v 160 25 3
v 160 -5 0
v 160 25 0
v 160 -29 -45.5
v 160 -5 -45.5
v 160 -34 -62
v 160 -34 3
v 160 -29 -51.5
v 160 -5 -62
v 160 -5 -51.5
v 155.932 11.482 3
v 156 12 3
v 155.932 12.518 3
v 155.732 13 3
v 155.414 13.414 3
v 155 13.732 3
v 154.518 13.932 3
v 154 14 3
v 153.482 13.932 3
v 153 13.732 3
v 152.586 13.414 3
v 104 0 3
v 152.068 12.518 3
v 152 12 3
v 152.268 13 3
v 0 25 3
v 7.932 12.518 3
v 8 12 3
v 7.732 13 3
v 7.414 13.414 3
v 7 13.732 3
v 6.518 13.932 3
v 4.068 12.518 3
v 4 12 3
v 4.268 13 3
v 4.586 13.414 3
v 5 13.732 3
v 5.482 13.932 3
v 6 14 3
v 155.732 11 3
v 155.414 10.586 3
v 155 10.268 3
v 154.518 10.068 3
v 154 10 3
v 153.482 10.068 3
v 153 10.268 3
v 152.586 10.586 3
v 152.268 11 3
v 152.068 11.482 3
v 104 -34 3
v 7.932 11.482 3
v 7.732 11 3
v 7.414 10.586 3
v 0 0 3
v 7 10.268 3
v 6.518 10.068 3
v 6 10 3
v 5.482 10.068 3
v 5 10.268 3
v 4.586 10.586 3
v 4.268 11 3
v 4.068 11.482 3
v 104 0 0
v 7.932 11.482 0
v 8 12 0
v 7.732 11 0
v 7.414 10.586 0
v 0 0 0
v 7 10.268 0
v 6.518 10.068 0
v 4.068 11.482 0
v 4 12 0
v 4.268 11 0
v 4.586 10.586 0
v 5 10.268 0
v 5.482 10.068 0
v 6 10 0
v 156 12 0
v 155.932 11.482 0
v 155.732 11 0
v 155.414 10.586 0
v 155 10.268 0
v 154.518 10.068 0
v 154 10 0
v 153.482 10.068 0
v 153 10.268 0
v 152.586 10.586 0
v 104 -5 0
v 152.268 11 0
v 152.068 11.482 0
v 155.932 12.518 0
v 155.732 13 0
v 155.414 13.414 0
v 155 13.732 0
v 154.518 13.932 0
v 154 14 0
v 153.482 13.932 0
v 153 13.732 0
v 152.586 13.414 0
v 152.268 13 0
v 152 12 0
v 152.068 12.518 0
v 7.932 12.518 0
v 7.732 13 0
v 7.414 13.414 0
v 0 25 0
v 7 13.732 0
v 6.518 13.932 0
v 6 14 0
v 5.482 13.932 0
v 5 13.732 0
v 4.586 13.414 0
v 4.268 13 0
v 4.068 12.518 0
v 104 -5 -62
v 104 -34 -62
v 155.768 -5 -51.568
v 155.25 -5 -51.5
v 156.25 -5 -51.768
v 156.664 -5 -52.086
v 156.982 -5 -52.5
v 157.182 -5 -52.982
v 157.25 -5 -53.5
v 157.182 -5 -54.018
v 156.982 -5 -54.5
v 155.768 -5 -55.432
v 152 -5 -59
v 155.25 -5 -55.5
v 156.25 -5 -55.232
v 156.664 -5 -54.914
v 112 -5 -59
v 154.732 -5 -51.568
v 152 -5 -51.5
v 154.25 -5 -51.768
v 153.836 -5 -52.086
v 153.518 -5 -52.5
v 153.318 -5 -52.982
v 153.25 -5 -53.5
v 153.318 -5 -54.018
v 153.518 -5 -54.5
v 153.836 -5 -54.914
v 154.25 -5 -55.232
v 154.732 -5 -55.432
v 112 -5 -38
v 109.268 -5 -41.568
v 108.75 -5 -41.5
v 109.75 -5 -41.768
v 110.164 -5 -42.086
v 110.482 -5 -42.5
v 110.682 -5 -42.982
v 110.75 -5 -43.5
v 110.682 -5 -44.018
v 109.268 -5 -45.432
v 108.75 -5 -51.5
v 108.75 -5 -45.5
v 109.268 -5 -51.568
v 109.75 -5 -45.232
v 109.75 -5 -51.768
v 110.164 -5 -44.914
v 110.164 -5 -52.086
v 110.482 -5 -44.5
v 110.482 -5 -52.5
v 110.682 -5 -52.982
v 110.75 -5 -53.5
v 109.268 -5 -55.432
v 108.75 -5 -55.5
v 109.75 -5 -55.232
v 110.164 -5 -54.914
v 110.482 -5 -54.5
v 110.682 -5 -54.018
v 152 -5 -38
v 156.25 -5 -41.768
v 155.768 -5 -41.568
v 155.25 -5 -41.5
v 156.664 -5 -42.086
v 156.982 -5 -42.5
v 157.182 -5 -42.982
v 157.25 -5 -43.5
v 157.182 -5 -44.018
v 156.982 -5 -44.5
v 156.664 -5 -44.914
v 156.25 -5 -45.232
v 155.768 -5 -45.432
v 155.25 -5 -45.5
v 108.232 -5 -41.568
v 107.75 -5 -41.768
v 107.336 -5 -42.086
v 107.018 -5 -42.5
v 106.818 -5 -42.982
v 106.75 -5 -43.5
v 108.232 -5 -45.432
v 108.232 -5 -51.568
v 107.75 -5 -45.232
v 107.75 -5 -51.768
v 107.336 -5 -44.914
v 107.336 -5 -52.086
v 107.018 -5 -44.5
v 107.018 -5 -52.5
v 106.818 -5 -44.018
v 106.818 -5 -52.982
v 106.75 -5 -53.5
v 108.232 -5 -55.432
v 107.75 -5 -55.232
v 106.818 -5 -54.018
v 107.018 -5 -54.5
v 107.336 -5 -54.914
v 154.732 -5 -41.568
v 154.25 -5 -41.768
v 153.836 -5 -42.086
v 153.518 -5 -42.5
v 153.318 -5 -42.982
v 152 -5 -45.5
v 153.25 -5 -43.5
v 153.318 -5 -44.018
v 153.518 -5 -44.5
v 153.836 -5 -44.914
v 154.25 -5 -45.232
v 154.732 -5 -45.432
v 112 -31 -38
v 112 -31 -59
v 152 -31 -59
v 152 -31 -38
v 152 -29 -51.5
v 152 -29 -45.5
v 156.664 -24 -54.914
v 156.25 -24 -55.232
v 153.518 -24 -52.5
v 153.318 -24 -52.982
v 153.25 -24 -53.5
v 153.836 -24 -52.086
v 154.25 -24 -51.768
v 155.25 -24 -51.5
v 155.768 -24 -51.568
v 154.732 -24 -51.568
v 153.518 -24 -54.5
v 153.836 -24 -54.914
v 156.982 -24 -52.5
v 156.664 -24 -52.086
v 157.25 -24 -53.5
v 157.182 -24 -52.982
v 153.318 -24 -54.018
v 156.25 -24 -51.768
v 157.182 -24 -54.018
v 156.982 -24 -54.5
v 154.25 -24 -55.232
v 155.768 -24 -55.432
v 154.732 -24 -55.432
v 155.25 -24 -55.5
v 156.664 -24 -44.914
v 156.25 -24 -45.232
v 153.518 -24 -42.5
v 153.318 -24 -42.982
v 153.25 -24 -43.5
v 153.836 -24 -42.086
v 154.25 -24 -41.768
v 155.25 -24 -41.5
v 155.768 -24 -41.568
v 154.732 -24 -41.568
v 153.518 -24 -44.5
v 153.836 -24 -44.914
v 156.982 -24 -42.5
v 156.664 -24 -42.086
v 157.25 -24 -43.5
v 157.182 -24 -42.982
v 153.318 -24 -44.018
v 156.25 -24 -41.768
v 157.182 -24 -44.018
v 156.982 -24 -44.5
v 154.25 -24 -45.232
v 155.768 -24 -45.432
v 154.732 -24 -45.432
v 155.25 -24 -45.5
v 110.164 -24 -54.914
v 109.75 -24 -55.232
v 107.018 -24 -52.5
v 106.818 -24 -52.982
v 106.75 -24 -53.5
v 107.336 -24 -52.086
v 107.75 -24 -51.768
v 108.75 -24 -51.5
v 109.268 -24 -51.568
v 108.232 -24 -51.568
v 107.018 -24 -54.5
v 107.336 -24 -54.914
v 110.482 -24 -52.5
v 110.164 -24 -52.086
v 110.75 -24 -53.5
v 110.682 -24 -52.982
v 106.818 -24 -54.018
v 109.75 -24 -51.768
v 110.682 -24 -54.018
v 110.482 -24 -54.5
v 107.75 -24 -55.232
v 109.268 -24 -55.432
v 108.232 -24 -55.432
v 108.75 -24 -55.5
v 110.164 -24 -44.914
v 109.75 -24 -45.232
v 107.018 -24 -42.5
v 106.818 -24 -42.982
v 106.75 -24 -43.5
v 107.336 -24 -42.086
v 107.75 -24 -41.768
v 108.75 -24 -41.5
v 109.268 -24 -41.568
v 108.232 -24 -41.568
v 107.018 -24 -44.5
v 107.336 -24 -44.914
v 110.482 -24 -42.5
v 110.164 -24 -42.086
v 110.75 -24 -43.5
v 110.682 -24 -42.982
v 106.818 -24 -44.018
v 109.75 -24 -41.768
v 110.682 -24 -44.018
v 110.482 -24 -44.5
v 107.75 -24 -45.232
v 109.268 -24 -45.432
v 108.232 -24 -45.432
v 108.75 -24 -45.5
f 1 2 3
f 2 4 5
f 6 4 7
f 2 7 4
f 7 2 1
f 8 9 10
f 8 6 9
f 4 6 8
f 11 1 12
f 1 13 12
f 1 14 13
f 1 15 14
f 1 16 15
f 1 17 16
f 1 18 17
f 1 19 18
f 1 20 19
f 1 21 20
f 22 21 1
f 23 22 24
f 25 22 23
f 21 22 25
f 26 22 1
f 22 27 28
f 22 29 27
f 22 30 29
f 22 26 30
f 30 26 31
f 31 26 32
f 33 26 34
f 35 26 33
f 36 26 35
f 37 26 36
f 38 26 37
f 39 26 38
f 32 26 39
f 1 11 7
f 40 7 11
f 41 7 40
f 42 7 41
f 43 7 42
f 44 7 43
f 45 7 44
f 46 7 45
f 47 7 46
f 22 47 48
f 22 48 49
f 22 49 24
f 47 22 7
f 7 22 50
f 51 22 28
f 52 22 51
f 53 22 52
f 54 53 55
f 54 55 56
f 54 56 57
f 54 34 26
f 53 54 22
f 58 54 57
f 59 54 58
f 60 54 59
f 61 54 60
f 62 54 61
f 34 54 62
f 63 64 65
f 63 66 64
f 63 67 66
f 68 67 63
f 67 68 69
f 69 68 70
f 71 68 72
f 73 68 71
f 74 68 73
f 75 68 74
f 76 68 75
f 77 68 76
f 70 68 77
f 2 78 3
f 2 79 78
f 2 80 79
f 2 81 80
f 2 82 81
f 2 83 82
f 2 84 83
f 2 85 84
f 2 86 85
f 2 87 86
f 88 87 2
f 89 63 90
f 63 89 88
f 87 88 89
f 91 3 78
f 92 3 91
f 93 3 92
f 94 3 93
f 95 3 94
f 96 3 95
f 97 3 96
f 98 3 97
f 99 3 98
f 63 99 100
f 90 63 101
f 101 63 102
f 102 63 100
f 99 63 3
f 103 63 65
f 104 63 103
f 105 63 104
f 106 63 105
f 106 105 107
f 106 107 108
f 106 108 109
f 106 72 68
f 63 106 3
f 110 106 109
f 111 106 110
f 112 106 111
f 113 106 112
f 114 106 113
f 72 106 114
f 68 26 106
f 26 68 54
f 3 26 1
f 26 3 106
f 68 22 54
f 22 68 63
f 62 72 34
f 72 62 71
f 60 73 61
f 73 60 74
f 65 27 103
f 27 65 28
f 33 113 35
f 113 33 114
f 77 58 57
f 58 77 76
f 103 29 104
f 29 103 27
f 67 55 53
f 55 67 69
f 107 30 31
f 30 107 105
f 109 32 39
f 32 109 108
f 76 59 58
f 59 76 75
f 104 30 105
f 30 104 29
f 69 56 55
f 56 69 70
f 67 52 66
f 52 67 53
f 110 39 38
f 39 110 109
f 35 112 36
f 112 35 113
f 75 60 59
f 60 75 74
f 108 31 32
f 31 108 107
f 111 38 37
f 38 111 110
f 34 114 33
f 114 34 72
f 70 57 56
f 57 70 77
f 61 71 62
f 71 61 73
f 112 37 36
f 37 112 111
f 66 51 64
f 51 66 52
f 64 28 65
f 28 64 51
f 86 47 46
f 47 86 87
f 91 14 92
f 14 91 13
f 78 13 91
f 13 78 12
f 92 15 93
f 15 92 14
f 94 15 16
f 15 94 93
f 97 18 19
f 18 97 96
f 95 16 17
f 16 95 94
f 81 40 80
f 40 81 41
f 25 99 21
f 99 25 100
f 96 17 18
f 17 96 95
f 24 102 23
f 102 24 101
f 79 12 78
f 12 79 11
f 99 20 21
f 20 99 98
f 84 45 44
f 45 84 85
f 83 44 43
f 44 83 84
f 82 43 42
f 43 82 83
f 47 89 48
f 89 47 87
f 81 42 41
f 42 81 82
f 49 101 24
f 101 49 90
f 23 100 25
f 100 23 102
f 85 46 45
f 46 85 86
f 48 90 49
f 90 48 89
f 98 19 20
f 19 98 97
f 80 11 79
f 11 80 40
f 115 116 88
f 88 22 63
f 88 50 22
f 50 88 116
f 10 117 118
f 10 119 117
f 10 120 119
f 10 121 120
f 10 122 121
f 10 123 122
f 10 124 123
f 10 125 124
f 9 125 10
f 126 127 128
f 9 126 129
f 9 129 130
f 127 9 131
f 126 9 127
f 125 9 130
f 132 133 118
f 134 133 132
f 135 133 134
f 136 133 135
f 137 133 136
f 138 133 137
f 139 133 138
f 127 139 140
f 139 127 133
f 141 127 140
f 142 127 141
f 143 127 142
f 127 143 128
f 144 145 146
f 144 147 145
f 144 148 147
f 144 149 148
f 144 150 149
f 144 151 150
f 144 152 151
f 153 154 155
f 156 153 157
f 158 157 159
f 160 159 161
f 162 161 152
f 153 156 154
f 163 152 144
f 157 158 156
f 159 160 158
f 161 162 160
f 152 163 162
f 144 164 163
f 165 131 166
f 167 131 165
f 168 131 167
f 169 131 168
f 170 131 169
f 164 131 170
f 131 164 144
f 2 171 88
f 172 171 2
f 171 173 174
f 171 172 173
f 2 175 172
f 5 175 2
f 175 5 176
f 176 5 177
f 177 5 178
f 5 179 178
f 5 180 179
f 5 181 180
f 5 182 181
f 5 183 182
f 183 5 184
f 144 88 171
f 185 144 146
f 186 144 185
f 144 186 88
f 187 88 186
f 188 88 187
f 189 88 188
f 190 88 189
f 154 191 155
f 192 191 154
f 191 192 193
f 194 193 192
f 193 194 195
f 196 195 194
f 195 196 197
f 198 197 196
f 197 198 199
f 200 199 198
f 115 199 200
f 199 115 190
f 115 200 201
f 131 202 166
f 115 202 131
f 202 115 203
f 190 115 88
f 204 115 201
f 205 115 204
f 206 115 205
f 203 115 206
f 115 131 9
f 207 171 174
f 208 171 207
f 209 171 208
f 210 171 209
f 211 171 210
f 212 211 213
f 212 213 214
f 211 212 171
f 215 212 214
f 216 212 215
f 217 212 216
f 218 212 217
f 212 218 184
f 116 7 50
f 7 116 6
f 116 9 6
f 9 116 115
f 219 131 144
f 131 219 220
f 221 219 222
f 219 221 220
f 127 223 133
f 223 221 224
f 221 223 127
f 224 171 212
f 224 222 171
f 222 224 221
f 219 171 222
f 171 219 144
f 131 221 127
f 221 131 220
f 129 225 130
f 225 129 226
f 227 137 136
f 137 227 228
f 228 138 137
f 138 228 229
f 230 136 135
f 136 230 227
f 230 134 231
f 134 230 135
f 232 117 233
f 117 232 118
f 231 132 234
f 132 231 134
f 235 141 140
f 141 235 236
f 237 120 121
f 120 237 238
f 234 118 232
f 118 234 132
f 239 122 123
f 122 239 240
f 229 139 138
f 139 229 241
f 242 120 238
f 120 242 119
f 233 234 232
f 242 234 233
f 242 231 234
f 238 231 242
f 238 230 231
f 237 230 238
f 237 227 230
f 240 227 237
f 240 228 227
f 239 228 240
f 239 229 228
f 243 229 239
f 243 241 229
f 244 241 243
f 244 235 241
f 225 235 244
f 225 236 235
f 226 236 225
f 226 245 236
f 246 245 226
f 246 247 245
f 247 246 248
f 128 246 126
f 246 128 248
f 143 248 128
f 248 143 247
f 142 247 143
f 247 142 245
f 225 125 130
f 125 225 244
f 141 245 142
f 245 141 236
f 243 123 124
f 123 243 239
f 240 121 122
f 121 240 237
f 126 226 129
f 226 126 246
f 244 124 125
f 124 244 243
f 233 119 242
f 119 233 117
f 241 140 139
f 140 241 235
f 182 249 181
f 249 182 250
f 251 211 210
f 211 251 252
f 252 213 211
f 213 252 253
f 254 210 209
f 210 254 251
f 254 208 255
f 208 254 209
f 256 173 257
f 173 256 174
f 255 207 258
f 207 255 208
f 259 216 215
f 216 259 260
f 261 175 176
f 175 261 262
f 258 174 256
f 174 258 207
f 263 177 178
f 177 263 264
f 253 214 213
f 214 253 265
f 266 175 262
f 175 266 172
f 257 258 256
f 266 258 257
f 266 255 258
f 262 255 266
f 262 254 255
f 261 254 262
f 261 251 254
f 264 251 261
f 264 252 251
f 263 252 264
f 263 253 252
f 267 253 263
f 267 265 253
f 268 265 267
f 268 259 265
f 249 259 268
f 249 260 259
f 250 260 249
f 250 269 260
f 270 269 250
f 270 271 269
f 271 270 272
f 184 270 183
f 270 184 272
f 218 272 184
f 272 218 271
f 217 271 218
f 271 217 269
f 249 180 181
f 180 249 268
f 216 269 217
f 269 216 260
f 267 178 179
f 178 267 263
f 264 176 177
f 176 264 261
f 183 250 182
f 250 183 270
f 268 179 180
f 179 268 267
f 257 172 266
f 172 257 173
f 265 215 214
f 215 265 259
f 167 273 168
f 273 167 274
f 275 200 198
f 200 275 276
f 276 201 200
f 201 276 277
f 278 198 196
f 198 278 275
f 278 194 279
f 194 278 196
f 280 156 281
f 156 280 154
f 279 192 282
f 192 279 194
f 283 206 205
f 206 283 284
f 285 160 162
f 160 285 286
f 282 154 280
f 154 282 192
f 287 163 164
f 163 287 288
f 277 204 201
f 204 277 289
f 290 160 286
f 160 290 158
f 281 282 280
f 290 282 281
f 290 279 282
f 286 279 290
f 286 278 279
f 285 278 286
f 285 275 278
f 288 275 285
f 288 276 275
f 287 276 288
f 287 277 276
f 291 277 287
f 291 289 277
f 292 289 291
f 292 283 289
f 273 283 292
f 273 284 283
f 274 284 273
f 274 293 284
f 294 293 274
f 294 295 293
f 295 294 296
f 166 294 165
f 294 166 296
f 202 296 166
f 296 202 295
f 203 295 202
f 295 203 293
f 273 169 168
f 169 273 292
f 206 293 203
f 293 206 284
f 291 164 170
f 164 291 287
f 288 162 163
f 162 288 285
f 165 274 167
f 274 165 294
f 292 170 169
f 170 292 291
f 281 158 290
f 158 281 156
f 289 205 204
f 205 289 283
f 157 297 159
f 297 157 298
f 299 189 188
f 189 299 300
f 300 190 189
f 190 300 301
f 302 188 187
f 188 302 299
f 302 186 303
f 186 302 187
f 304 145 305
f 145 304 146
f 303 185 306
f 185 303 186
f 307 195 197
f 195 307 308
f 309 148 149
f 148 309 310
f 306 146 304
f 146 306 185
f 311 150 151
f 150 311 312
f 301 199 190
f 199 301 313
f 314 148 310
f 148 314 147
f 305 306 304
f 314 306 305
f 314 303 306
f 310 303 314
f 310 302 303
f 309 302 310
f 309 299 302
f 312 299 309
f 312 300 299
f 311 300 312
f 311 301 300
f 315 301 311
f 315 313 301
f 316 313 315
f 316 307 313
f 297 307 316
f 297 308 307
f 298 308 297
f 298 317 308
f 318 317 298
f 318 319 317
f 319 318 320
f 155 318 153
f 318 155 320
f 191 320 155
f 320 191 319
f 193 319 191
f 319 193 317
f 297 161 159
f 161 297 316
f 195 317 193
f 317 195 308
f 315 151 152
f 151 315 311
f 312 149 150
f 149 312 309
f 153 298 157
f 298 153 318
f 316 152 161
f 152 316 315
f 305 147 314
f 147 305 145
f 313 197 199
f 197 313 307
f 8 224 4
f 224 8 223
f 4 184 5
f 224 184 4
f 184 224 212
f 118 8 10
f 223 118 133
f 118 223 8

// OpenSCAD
// servo motor holder


difference() {
    cube([160, 25, 3]);
    translate([6, 12, -1])
    cylinder(d1=4, d2=4, h=5, $fn=24);
    translate([154, 12, -1])
    cylinder(d1=4, d2=4, h=5, $fn=24);
}


translate([104, -34, 0])
cube([56, 40, 3]);

translate([104, -34, -35])
cube([56, 29, 35.5]);

translate([160, -34, -62])
rotate([-90, 180, 0])
difference() {
    cube([56, 27, 29]);
    translate([8, 3, 3])
    cube([40, 21, 41]);
    translate([4.75, 8.5, 10])
    cylinder(d1=4, d2=4, h=25, $fn=24);
    translate([4.75, 18.5, 10])
    cylinder(d1=4, d2=4, h=25, $fn=24);
    translate([51.25, 8.5, 10])
    cylinder(d1=4, d2=4, h=25, $fn=24);
    translate([51.25, 18.5, 10])
    cylinder(d1=4, d2=4, h=25, $fn=24);
    
    //6 x 22
    translate([-1, 10.5, 5])
    cube([10, 6, 30]);
}
